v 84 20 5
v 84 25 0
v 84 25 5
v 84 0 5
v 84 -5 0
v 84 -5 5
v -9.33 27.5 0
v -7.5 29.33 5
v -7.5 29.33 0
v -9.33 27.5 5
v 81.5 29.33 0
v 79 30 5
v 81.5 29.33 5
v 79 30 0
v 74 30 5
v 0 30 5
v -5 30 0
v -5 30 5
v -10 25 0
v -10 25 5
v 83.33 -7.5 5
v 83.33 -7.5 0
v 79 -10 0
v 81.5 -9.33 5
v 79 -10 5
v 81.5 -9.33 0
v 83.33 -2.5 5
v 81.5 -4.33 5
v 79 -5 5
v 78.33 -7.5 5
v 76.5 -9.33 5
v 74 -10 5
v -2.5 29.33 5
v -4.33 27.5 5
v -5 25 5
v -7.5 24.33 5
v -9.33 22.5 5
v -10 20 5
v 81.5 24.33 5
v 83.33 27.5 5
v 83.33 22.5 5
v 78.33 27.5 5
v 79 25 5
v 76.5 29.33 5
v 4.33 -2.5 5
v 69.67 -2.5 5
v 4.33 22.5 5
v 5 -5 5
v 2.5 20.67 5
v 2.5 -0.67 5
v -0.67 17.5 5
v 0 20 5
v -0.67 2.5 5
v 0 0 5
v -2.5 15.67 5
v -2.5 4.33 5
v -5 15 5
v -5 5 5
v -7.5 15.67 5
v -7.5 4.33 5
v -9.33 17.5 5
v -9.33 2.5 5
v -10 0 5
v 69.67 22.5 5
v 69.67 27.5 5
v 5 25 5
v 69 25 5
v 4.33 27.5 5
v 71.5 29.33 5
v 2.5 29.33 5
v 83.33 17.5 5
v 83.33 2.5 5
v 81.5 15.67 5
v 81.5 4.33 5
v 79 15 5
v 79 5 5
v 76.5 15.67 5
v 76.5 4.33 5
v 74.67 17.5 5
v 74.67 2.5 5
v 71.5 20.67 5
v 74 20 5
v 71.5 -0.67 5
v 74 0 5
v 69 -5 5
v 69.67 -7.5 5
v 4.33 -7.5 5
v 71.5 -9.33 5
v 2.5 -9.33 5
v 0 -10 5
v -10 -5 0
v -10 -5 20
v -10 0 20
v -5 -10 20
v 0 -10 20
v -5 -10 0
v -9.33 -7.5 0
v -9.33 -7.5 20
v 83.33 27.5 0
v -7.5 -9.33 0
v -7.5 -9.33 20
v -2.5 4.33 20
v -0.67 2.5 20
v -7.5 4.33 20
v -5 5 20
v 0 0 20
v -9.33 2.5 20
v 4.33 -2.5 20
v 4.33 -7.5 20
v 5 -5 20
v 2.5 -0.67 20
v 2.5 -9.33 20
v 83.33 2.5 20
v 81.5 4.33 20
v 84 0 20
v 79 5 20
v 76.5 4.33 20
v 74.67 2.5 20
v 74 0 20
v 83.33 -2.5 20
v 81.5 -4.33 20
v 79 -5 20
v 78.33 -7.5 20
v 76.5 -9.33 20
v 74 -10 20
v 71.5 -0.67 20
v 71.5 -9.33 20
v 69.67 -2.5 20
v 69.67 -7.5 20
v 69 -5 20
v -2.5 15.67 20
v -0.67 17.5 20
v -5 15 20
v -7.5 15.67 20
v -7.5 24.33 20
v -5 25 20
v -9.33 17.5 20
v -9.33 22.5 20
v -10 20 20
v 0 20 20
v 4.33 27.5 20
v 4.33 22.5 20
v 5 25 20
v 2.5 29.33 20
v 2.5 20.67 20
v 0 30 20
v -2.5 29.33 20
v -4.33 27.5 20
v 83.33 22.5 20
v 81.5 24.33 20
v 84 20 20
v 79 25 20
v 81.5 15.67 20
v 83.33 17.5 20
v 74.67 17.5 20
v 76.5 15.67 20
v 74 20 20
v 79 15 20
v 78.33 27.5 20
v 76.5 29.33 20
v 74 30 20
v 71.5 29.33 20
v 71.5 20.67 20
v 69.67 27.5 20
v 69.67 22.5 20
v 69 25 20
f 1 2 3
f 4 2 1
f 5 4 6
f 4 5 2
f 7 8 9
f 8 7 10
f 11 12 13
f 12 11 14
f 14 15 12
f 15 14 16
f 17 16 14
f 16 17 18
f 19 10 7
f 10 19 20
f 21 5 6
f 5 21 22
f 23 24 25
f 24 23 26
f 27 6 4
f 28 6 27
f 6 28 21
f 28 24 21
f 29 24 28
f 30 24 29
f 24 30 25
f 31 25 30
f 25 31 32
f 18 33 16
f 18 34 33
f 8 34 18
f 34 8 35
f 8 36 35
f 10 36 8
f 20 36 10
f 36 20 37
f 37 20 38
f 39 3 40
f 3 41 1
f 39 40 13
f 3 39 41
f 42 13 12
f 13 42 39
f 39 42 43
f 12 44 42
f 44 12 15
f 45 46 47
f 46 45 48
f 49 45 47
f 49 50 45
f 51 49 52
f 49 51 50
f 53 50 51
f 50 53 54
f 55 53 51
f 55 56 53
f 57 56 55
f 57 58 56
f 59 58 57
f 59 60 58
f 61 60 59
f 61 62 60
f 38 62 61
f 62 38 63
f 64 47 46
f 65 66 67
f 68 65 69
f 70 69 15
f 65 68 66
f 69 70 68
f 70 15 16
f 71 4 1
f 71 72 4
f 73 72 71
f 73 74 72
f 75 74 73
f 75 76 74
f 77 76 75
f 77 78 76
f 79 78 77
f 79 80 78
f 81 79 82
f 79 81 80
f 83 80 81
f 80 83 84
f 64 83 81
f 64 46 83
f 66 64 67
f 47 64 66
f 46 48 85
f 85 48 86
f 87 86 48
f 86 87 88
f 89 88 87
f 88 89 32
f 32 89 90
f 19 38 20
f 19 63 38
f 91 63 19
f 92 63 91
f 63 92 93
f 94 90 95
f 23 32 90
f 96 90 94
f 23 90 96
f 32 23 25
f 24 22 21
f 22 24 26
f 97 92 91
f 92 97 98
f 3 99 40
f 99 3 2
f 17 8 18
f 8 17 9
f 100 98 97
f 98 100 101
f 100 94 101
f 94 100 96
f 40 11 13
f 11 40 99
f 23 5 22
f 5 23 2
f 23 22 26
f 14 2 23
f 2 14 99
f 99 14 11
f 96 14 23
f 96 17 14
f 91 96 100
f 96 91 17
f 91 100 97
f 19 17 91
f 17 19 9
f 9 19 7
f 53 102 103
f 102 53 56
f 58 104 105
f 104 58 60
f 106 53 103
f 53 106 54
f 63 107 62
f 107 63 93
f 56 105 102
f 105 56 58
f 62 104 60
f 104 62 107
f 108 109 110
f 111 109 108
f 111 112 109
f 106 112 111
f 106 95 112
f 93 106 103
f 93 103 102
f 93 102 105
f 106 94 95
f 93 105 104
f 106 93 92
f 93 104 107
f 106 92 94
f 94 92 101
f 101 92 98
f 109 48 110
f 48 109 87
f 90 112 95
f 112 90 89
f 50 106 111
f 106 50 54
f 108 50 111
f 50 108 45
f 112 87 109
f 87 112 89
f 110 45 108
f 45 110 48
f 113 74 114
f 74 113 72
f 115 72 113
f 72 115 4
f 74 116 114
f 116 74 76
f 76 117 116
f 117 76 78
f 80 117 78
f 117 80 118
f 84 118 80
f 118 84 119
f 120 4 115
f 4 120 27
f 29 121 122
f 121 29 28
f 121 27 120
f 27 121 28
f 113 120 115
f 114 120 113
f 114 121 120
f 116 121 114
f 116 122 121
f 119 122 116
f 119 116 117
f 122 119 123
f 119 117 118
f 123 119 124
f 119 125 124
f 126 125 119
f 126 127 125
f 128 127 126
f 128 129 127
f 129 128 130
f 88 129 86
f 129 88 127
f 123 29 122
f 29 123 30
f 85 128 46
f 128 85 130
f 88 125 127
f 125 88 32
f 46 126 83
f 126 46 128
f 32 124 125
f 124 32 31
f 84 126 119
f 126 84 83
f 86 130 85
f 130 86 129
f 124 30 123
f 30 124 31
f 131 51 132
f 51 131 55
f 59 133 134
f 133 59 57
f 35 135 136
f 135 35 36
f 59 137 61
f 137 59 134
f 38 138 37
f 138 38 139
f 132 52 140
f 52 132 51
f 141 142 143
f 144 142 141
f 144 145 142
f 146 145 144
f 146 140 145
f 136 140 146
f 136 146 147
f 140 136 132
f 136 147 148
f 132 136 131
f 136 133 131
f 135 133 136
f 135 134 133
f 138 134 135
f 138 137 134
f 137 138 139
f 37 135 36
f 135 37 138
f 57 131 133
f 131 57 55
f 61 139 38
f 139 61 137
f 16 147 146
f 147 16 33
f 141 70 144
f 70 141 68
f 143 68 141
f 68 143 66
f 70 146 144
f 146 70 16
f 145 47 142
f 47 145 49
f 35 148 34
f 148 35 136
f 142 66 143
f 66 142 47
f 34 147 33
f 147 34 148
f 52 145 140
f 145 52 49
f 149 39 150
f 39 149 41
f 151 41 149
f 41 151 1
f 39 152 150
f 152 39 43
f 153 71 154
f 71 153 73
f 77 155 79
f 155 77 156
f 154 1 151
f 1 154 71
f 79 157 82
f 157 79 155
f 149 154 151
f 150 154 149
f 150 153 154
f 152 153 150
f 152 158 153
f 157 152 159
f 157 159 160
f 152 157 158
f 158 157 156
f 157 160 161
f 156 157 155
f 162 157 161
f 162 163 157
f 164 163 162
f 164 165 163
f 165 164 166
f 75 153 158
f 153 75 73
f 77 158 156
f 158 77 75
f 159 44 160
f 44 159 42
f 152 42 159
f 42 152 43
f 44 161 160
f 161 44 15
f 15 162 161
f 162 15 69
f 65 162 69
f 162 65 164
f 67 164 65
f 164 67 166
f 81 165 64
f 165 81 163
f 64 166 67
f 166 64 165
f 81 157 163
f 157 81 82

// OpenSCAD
peg_height = 20;
peg_width = 10;

base_length = 74;
base_width = 20;
base_height = 5;


fn_upper = 50;
fn_lower = 12;

rc = false;
$fn = rc ? fn_upper : fn_lower;


hull() {
    translate([-(peg_width / 2), - (peg_width / 2), 0]) {
        cylinder(d = peg_width, h = base_height);
    }
    translate([base_length + (peg_width / 2), - (peg_width / 2), 0]) {
        cylinder(d = peg_width, h = base_height);
    }
    translate([-(peg_width / 2), base_width + (peg_width / 2), 0]) {
        cylinder(d = peg_width, h = base_height);
    }
    translate([base_length + (peg_width / 2), base_width + (peg_width / 2), 0]) {
        cylinder(d = peg_width, h = base_height);
    }
}


hull() {
translate([-(peg_width / 2), 0, 0]) {
    color("green") cylinder(d = peg_width, h = peg_height);
}
translate([-(peg_width / 2), -(peg_width / 2), 0]) {
    color("green") cylinder(d = peg_width, h = peg_height);
}
}
color("pink") hull() {
    translate([0, -(peg_width / 2), 0]) {
    cylinder(d = peg_width, h = peg_height);
}
translate([-(peg_width / 2), -(peg_width / 2), 0]) {
    color("green") cylinder(d = peg_width, h = peg_height);
}
}

translate([base_length + (peg_width / 2), 0, 0]) {
    color("blue") cylinder(d = peg_width, h = peg_height);
}
translate([base_length,  -(peg_width / 2), 0]) {
    cylinder(d = peg_width, h = peg_height);
}

translate([-(peg_width / 2), base_width, 0]) {
    color("orange") cylinder(d = peg_width, h = peg_height);
}
translate([0, (peg_width / 2) + base_width, 0]) {
    cylinder(d = peg_width, h = peg_height);
}

translate([base_length + (peg_width / 2), base_width, 0]) {
    color("grey") cylinder(d = peg_width, h = peg_height);
}
translate([base_length , base_width+ (peg_width / 2), 0]) {
    cylinder(d = peg_width, h = peg_height);
}

//color("red") cube([74, 20, 10]);
